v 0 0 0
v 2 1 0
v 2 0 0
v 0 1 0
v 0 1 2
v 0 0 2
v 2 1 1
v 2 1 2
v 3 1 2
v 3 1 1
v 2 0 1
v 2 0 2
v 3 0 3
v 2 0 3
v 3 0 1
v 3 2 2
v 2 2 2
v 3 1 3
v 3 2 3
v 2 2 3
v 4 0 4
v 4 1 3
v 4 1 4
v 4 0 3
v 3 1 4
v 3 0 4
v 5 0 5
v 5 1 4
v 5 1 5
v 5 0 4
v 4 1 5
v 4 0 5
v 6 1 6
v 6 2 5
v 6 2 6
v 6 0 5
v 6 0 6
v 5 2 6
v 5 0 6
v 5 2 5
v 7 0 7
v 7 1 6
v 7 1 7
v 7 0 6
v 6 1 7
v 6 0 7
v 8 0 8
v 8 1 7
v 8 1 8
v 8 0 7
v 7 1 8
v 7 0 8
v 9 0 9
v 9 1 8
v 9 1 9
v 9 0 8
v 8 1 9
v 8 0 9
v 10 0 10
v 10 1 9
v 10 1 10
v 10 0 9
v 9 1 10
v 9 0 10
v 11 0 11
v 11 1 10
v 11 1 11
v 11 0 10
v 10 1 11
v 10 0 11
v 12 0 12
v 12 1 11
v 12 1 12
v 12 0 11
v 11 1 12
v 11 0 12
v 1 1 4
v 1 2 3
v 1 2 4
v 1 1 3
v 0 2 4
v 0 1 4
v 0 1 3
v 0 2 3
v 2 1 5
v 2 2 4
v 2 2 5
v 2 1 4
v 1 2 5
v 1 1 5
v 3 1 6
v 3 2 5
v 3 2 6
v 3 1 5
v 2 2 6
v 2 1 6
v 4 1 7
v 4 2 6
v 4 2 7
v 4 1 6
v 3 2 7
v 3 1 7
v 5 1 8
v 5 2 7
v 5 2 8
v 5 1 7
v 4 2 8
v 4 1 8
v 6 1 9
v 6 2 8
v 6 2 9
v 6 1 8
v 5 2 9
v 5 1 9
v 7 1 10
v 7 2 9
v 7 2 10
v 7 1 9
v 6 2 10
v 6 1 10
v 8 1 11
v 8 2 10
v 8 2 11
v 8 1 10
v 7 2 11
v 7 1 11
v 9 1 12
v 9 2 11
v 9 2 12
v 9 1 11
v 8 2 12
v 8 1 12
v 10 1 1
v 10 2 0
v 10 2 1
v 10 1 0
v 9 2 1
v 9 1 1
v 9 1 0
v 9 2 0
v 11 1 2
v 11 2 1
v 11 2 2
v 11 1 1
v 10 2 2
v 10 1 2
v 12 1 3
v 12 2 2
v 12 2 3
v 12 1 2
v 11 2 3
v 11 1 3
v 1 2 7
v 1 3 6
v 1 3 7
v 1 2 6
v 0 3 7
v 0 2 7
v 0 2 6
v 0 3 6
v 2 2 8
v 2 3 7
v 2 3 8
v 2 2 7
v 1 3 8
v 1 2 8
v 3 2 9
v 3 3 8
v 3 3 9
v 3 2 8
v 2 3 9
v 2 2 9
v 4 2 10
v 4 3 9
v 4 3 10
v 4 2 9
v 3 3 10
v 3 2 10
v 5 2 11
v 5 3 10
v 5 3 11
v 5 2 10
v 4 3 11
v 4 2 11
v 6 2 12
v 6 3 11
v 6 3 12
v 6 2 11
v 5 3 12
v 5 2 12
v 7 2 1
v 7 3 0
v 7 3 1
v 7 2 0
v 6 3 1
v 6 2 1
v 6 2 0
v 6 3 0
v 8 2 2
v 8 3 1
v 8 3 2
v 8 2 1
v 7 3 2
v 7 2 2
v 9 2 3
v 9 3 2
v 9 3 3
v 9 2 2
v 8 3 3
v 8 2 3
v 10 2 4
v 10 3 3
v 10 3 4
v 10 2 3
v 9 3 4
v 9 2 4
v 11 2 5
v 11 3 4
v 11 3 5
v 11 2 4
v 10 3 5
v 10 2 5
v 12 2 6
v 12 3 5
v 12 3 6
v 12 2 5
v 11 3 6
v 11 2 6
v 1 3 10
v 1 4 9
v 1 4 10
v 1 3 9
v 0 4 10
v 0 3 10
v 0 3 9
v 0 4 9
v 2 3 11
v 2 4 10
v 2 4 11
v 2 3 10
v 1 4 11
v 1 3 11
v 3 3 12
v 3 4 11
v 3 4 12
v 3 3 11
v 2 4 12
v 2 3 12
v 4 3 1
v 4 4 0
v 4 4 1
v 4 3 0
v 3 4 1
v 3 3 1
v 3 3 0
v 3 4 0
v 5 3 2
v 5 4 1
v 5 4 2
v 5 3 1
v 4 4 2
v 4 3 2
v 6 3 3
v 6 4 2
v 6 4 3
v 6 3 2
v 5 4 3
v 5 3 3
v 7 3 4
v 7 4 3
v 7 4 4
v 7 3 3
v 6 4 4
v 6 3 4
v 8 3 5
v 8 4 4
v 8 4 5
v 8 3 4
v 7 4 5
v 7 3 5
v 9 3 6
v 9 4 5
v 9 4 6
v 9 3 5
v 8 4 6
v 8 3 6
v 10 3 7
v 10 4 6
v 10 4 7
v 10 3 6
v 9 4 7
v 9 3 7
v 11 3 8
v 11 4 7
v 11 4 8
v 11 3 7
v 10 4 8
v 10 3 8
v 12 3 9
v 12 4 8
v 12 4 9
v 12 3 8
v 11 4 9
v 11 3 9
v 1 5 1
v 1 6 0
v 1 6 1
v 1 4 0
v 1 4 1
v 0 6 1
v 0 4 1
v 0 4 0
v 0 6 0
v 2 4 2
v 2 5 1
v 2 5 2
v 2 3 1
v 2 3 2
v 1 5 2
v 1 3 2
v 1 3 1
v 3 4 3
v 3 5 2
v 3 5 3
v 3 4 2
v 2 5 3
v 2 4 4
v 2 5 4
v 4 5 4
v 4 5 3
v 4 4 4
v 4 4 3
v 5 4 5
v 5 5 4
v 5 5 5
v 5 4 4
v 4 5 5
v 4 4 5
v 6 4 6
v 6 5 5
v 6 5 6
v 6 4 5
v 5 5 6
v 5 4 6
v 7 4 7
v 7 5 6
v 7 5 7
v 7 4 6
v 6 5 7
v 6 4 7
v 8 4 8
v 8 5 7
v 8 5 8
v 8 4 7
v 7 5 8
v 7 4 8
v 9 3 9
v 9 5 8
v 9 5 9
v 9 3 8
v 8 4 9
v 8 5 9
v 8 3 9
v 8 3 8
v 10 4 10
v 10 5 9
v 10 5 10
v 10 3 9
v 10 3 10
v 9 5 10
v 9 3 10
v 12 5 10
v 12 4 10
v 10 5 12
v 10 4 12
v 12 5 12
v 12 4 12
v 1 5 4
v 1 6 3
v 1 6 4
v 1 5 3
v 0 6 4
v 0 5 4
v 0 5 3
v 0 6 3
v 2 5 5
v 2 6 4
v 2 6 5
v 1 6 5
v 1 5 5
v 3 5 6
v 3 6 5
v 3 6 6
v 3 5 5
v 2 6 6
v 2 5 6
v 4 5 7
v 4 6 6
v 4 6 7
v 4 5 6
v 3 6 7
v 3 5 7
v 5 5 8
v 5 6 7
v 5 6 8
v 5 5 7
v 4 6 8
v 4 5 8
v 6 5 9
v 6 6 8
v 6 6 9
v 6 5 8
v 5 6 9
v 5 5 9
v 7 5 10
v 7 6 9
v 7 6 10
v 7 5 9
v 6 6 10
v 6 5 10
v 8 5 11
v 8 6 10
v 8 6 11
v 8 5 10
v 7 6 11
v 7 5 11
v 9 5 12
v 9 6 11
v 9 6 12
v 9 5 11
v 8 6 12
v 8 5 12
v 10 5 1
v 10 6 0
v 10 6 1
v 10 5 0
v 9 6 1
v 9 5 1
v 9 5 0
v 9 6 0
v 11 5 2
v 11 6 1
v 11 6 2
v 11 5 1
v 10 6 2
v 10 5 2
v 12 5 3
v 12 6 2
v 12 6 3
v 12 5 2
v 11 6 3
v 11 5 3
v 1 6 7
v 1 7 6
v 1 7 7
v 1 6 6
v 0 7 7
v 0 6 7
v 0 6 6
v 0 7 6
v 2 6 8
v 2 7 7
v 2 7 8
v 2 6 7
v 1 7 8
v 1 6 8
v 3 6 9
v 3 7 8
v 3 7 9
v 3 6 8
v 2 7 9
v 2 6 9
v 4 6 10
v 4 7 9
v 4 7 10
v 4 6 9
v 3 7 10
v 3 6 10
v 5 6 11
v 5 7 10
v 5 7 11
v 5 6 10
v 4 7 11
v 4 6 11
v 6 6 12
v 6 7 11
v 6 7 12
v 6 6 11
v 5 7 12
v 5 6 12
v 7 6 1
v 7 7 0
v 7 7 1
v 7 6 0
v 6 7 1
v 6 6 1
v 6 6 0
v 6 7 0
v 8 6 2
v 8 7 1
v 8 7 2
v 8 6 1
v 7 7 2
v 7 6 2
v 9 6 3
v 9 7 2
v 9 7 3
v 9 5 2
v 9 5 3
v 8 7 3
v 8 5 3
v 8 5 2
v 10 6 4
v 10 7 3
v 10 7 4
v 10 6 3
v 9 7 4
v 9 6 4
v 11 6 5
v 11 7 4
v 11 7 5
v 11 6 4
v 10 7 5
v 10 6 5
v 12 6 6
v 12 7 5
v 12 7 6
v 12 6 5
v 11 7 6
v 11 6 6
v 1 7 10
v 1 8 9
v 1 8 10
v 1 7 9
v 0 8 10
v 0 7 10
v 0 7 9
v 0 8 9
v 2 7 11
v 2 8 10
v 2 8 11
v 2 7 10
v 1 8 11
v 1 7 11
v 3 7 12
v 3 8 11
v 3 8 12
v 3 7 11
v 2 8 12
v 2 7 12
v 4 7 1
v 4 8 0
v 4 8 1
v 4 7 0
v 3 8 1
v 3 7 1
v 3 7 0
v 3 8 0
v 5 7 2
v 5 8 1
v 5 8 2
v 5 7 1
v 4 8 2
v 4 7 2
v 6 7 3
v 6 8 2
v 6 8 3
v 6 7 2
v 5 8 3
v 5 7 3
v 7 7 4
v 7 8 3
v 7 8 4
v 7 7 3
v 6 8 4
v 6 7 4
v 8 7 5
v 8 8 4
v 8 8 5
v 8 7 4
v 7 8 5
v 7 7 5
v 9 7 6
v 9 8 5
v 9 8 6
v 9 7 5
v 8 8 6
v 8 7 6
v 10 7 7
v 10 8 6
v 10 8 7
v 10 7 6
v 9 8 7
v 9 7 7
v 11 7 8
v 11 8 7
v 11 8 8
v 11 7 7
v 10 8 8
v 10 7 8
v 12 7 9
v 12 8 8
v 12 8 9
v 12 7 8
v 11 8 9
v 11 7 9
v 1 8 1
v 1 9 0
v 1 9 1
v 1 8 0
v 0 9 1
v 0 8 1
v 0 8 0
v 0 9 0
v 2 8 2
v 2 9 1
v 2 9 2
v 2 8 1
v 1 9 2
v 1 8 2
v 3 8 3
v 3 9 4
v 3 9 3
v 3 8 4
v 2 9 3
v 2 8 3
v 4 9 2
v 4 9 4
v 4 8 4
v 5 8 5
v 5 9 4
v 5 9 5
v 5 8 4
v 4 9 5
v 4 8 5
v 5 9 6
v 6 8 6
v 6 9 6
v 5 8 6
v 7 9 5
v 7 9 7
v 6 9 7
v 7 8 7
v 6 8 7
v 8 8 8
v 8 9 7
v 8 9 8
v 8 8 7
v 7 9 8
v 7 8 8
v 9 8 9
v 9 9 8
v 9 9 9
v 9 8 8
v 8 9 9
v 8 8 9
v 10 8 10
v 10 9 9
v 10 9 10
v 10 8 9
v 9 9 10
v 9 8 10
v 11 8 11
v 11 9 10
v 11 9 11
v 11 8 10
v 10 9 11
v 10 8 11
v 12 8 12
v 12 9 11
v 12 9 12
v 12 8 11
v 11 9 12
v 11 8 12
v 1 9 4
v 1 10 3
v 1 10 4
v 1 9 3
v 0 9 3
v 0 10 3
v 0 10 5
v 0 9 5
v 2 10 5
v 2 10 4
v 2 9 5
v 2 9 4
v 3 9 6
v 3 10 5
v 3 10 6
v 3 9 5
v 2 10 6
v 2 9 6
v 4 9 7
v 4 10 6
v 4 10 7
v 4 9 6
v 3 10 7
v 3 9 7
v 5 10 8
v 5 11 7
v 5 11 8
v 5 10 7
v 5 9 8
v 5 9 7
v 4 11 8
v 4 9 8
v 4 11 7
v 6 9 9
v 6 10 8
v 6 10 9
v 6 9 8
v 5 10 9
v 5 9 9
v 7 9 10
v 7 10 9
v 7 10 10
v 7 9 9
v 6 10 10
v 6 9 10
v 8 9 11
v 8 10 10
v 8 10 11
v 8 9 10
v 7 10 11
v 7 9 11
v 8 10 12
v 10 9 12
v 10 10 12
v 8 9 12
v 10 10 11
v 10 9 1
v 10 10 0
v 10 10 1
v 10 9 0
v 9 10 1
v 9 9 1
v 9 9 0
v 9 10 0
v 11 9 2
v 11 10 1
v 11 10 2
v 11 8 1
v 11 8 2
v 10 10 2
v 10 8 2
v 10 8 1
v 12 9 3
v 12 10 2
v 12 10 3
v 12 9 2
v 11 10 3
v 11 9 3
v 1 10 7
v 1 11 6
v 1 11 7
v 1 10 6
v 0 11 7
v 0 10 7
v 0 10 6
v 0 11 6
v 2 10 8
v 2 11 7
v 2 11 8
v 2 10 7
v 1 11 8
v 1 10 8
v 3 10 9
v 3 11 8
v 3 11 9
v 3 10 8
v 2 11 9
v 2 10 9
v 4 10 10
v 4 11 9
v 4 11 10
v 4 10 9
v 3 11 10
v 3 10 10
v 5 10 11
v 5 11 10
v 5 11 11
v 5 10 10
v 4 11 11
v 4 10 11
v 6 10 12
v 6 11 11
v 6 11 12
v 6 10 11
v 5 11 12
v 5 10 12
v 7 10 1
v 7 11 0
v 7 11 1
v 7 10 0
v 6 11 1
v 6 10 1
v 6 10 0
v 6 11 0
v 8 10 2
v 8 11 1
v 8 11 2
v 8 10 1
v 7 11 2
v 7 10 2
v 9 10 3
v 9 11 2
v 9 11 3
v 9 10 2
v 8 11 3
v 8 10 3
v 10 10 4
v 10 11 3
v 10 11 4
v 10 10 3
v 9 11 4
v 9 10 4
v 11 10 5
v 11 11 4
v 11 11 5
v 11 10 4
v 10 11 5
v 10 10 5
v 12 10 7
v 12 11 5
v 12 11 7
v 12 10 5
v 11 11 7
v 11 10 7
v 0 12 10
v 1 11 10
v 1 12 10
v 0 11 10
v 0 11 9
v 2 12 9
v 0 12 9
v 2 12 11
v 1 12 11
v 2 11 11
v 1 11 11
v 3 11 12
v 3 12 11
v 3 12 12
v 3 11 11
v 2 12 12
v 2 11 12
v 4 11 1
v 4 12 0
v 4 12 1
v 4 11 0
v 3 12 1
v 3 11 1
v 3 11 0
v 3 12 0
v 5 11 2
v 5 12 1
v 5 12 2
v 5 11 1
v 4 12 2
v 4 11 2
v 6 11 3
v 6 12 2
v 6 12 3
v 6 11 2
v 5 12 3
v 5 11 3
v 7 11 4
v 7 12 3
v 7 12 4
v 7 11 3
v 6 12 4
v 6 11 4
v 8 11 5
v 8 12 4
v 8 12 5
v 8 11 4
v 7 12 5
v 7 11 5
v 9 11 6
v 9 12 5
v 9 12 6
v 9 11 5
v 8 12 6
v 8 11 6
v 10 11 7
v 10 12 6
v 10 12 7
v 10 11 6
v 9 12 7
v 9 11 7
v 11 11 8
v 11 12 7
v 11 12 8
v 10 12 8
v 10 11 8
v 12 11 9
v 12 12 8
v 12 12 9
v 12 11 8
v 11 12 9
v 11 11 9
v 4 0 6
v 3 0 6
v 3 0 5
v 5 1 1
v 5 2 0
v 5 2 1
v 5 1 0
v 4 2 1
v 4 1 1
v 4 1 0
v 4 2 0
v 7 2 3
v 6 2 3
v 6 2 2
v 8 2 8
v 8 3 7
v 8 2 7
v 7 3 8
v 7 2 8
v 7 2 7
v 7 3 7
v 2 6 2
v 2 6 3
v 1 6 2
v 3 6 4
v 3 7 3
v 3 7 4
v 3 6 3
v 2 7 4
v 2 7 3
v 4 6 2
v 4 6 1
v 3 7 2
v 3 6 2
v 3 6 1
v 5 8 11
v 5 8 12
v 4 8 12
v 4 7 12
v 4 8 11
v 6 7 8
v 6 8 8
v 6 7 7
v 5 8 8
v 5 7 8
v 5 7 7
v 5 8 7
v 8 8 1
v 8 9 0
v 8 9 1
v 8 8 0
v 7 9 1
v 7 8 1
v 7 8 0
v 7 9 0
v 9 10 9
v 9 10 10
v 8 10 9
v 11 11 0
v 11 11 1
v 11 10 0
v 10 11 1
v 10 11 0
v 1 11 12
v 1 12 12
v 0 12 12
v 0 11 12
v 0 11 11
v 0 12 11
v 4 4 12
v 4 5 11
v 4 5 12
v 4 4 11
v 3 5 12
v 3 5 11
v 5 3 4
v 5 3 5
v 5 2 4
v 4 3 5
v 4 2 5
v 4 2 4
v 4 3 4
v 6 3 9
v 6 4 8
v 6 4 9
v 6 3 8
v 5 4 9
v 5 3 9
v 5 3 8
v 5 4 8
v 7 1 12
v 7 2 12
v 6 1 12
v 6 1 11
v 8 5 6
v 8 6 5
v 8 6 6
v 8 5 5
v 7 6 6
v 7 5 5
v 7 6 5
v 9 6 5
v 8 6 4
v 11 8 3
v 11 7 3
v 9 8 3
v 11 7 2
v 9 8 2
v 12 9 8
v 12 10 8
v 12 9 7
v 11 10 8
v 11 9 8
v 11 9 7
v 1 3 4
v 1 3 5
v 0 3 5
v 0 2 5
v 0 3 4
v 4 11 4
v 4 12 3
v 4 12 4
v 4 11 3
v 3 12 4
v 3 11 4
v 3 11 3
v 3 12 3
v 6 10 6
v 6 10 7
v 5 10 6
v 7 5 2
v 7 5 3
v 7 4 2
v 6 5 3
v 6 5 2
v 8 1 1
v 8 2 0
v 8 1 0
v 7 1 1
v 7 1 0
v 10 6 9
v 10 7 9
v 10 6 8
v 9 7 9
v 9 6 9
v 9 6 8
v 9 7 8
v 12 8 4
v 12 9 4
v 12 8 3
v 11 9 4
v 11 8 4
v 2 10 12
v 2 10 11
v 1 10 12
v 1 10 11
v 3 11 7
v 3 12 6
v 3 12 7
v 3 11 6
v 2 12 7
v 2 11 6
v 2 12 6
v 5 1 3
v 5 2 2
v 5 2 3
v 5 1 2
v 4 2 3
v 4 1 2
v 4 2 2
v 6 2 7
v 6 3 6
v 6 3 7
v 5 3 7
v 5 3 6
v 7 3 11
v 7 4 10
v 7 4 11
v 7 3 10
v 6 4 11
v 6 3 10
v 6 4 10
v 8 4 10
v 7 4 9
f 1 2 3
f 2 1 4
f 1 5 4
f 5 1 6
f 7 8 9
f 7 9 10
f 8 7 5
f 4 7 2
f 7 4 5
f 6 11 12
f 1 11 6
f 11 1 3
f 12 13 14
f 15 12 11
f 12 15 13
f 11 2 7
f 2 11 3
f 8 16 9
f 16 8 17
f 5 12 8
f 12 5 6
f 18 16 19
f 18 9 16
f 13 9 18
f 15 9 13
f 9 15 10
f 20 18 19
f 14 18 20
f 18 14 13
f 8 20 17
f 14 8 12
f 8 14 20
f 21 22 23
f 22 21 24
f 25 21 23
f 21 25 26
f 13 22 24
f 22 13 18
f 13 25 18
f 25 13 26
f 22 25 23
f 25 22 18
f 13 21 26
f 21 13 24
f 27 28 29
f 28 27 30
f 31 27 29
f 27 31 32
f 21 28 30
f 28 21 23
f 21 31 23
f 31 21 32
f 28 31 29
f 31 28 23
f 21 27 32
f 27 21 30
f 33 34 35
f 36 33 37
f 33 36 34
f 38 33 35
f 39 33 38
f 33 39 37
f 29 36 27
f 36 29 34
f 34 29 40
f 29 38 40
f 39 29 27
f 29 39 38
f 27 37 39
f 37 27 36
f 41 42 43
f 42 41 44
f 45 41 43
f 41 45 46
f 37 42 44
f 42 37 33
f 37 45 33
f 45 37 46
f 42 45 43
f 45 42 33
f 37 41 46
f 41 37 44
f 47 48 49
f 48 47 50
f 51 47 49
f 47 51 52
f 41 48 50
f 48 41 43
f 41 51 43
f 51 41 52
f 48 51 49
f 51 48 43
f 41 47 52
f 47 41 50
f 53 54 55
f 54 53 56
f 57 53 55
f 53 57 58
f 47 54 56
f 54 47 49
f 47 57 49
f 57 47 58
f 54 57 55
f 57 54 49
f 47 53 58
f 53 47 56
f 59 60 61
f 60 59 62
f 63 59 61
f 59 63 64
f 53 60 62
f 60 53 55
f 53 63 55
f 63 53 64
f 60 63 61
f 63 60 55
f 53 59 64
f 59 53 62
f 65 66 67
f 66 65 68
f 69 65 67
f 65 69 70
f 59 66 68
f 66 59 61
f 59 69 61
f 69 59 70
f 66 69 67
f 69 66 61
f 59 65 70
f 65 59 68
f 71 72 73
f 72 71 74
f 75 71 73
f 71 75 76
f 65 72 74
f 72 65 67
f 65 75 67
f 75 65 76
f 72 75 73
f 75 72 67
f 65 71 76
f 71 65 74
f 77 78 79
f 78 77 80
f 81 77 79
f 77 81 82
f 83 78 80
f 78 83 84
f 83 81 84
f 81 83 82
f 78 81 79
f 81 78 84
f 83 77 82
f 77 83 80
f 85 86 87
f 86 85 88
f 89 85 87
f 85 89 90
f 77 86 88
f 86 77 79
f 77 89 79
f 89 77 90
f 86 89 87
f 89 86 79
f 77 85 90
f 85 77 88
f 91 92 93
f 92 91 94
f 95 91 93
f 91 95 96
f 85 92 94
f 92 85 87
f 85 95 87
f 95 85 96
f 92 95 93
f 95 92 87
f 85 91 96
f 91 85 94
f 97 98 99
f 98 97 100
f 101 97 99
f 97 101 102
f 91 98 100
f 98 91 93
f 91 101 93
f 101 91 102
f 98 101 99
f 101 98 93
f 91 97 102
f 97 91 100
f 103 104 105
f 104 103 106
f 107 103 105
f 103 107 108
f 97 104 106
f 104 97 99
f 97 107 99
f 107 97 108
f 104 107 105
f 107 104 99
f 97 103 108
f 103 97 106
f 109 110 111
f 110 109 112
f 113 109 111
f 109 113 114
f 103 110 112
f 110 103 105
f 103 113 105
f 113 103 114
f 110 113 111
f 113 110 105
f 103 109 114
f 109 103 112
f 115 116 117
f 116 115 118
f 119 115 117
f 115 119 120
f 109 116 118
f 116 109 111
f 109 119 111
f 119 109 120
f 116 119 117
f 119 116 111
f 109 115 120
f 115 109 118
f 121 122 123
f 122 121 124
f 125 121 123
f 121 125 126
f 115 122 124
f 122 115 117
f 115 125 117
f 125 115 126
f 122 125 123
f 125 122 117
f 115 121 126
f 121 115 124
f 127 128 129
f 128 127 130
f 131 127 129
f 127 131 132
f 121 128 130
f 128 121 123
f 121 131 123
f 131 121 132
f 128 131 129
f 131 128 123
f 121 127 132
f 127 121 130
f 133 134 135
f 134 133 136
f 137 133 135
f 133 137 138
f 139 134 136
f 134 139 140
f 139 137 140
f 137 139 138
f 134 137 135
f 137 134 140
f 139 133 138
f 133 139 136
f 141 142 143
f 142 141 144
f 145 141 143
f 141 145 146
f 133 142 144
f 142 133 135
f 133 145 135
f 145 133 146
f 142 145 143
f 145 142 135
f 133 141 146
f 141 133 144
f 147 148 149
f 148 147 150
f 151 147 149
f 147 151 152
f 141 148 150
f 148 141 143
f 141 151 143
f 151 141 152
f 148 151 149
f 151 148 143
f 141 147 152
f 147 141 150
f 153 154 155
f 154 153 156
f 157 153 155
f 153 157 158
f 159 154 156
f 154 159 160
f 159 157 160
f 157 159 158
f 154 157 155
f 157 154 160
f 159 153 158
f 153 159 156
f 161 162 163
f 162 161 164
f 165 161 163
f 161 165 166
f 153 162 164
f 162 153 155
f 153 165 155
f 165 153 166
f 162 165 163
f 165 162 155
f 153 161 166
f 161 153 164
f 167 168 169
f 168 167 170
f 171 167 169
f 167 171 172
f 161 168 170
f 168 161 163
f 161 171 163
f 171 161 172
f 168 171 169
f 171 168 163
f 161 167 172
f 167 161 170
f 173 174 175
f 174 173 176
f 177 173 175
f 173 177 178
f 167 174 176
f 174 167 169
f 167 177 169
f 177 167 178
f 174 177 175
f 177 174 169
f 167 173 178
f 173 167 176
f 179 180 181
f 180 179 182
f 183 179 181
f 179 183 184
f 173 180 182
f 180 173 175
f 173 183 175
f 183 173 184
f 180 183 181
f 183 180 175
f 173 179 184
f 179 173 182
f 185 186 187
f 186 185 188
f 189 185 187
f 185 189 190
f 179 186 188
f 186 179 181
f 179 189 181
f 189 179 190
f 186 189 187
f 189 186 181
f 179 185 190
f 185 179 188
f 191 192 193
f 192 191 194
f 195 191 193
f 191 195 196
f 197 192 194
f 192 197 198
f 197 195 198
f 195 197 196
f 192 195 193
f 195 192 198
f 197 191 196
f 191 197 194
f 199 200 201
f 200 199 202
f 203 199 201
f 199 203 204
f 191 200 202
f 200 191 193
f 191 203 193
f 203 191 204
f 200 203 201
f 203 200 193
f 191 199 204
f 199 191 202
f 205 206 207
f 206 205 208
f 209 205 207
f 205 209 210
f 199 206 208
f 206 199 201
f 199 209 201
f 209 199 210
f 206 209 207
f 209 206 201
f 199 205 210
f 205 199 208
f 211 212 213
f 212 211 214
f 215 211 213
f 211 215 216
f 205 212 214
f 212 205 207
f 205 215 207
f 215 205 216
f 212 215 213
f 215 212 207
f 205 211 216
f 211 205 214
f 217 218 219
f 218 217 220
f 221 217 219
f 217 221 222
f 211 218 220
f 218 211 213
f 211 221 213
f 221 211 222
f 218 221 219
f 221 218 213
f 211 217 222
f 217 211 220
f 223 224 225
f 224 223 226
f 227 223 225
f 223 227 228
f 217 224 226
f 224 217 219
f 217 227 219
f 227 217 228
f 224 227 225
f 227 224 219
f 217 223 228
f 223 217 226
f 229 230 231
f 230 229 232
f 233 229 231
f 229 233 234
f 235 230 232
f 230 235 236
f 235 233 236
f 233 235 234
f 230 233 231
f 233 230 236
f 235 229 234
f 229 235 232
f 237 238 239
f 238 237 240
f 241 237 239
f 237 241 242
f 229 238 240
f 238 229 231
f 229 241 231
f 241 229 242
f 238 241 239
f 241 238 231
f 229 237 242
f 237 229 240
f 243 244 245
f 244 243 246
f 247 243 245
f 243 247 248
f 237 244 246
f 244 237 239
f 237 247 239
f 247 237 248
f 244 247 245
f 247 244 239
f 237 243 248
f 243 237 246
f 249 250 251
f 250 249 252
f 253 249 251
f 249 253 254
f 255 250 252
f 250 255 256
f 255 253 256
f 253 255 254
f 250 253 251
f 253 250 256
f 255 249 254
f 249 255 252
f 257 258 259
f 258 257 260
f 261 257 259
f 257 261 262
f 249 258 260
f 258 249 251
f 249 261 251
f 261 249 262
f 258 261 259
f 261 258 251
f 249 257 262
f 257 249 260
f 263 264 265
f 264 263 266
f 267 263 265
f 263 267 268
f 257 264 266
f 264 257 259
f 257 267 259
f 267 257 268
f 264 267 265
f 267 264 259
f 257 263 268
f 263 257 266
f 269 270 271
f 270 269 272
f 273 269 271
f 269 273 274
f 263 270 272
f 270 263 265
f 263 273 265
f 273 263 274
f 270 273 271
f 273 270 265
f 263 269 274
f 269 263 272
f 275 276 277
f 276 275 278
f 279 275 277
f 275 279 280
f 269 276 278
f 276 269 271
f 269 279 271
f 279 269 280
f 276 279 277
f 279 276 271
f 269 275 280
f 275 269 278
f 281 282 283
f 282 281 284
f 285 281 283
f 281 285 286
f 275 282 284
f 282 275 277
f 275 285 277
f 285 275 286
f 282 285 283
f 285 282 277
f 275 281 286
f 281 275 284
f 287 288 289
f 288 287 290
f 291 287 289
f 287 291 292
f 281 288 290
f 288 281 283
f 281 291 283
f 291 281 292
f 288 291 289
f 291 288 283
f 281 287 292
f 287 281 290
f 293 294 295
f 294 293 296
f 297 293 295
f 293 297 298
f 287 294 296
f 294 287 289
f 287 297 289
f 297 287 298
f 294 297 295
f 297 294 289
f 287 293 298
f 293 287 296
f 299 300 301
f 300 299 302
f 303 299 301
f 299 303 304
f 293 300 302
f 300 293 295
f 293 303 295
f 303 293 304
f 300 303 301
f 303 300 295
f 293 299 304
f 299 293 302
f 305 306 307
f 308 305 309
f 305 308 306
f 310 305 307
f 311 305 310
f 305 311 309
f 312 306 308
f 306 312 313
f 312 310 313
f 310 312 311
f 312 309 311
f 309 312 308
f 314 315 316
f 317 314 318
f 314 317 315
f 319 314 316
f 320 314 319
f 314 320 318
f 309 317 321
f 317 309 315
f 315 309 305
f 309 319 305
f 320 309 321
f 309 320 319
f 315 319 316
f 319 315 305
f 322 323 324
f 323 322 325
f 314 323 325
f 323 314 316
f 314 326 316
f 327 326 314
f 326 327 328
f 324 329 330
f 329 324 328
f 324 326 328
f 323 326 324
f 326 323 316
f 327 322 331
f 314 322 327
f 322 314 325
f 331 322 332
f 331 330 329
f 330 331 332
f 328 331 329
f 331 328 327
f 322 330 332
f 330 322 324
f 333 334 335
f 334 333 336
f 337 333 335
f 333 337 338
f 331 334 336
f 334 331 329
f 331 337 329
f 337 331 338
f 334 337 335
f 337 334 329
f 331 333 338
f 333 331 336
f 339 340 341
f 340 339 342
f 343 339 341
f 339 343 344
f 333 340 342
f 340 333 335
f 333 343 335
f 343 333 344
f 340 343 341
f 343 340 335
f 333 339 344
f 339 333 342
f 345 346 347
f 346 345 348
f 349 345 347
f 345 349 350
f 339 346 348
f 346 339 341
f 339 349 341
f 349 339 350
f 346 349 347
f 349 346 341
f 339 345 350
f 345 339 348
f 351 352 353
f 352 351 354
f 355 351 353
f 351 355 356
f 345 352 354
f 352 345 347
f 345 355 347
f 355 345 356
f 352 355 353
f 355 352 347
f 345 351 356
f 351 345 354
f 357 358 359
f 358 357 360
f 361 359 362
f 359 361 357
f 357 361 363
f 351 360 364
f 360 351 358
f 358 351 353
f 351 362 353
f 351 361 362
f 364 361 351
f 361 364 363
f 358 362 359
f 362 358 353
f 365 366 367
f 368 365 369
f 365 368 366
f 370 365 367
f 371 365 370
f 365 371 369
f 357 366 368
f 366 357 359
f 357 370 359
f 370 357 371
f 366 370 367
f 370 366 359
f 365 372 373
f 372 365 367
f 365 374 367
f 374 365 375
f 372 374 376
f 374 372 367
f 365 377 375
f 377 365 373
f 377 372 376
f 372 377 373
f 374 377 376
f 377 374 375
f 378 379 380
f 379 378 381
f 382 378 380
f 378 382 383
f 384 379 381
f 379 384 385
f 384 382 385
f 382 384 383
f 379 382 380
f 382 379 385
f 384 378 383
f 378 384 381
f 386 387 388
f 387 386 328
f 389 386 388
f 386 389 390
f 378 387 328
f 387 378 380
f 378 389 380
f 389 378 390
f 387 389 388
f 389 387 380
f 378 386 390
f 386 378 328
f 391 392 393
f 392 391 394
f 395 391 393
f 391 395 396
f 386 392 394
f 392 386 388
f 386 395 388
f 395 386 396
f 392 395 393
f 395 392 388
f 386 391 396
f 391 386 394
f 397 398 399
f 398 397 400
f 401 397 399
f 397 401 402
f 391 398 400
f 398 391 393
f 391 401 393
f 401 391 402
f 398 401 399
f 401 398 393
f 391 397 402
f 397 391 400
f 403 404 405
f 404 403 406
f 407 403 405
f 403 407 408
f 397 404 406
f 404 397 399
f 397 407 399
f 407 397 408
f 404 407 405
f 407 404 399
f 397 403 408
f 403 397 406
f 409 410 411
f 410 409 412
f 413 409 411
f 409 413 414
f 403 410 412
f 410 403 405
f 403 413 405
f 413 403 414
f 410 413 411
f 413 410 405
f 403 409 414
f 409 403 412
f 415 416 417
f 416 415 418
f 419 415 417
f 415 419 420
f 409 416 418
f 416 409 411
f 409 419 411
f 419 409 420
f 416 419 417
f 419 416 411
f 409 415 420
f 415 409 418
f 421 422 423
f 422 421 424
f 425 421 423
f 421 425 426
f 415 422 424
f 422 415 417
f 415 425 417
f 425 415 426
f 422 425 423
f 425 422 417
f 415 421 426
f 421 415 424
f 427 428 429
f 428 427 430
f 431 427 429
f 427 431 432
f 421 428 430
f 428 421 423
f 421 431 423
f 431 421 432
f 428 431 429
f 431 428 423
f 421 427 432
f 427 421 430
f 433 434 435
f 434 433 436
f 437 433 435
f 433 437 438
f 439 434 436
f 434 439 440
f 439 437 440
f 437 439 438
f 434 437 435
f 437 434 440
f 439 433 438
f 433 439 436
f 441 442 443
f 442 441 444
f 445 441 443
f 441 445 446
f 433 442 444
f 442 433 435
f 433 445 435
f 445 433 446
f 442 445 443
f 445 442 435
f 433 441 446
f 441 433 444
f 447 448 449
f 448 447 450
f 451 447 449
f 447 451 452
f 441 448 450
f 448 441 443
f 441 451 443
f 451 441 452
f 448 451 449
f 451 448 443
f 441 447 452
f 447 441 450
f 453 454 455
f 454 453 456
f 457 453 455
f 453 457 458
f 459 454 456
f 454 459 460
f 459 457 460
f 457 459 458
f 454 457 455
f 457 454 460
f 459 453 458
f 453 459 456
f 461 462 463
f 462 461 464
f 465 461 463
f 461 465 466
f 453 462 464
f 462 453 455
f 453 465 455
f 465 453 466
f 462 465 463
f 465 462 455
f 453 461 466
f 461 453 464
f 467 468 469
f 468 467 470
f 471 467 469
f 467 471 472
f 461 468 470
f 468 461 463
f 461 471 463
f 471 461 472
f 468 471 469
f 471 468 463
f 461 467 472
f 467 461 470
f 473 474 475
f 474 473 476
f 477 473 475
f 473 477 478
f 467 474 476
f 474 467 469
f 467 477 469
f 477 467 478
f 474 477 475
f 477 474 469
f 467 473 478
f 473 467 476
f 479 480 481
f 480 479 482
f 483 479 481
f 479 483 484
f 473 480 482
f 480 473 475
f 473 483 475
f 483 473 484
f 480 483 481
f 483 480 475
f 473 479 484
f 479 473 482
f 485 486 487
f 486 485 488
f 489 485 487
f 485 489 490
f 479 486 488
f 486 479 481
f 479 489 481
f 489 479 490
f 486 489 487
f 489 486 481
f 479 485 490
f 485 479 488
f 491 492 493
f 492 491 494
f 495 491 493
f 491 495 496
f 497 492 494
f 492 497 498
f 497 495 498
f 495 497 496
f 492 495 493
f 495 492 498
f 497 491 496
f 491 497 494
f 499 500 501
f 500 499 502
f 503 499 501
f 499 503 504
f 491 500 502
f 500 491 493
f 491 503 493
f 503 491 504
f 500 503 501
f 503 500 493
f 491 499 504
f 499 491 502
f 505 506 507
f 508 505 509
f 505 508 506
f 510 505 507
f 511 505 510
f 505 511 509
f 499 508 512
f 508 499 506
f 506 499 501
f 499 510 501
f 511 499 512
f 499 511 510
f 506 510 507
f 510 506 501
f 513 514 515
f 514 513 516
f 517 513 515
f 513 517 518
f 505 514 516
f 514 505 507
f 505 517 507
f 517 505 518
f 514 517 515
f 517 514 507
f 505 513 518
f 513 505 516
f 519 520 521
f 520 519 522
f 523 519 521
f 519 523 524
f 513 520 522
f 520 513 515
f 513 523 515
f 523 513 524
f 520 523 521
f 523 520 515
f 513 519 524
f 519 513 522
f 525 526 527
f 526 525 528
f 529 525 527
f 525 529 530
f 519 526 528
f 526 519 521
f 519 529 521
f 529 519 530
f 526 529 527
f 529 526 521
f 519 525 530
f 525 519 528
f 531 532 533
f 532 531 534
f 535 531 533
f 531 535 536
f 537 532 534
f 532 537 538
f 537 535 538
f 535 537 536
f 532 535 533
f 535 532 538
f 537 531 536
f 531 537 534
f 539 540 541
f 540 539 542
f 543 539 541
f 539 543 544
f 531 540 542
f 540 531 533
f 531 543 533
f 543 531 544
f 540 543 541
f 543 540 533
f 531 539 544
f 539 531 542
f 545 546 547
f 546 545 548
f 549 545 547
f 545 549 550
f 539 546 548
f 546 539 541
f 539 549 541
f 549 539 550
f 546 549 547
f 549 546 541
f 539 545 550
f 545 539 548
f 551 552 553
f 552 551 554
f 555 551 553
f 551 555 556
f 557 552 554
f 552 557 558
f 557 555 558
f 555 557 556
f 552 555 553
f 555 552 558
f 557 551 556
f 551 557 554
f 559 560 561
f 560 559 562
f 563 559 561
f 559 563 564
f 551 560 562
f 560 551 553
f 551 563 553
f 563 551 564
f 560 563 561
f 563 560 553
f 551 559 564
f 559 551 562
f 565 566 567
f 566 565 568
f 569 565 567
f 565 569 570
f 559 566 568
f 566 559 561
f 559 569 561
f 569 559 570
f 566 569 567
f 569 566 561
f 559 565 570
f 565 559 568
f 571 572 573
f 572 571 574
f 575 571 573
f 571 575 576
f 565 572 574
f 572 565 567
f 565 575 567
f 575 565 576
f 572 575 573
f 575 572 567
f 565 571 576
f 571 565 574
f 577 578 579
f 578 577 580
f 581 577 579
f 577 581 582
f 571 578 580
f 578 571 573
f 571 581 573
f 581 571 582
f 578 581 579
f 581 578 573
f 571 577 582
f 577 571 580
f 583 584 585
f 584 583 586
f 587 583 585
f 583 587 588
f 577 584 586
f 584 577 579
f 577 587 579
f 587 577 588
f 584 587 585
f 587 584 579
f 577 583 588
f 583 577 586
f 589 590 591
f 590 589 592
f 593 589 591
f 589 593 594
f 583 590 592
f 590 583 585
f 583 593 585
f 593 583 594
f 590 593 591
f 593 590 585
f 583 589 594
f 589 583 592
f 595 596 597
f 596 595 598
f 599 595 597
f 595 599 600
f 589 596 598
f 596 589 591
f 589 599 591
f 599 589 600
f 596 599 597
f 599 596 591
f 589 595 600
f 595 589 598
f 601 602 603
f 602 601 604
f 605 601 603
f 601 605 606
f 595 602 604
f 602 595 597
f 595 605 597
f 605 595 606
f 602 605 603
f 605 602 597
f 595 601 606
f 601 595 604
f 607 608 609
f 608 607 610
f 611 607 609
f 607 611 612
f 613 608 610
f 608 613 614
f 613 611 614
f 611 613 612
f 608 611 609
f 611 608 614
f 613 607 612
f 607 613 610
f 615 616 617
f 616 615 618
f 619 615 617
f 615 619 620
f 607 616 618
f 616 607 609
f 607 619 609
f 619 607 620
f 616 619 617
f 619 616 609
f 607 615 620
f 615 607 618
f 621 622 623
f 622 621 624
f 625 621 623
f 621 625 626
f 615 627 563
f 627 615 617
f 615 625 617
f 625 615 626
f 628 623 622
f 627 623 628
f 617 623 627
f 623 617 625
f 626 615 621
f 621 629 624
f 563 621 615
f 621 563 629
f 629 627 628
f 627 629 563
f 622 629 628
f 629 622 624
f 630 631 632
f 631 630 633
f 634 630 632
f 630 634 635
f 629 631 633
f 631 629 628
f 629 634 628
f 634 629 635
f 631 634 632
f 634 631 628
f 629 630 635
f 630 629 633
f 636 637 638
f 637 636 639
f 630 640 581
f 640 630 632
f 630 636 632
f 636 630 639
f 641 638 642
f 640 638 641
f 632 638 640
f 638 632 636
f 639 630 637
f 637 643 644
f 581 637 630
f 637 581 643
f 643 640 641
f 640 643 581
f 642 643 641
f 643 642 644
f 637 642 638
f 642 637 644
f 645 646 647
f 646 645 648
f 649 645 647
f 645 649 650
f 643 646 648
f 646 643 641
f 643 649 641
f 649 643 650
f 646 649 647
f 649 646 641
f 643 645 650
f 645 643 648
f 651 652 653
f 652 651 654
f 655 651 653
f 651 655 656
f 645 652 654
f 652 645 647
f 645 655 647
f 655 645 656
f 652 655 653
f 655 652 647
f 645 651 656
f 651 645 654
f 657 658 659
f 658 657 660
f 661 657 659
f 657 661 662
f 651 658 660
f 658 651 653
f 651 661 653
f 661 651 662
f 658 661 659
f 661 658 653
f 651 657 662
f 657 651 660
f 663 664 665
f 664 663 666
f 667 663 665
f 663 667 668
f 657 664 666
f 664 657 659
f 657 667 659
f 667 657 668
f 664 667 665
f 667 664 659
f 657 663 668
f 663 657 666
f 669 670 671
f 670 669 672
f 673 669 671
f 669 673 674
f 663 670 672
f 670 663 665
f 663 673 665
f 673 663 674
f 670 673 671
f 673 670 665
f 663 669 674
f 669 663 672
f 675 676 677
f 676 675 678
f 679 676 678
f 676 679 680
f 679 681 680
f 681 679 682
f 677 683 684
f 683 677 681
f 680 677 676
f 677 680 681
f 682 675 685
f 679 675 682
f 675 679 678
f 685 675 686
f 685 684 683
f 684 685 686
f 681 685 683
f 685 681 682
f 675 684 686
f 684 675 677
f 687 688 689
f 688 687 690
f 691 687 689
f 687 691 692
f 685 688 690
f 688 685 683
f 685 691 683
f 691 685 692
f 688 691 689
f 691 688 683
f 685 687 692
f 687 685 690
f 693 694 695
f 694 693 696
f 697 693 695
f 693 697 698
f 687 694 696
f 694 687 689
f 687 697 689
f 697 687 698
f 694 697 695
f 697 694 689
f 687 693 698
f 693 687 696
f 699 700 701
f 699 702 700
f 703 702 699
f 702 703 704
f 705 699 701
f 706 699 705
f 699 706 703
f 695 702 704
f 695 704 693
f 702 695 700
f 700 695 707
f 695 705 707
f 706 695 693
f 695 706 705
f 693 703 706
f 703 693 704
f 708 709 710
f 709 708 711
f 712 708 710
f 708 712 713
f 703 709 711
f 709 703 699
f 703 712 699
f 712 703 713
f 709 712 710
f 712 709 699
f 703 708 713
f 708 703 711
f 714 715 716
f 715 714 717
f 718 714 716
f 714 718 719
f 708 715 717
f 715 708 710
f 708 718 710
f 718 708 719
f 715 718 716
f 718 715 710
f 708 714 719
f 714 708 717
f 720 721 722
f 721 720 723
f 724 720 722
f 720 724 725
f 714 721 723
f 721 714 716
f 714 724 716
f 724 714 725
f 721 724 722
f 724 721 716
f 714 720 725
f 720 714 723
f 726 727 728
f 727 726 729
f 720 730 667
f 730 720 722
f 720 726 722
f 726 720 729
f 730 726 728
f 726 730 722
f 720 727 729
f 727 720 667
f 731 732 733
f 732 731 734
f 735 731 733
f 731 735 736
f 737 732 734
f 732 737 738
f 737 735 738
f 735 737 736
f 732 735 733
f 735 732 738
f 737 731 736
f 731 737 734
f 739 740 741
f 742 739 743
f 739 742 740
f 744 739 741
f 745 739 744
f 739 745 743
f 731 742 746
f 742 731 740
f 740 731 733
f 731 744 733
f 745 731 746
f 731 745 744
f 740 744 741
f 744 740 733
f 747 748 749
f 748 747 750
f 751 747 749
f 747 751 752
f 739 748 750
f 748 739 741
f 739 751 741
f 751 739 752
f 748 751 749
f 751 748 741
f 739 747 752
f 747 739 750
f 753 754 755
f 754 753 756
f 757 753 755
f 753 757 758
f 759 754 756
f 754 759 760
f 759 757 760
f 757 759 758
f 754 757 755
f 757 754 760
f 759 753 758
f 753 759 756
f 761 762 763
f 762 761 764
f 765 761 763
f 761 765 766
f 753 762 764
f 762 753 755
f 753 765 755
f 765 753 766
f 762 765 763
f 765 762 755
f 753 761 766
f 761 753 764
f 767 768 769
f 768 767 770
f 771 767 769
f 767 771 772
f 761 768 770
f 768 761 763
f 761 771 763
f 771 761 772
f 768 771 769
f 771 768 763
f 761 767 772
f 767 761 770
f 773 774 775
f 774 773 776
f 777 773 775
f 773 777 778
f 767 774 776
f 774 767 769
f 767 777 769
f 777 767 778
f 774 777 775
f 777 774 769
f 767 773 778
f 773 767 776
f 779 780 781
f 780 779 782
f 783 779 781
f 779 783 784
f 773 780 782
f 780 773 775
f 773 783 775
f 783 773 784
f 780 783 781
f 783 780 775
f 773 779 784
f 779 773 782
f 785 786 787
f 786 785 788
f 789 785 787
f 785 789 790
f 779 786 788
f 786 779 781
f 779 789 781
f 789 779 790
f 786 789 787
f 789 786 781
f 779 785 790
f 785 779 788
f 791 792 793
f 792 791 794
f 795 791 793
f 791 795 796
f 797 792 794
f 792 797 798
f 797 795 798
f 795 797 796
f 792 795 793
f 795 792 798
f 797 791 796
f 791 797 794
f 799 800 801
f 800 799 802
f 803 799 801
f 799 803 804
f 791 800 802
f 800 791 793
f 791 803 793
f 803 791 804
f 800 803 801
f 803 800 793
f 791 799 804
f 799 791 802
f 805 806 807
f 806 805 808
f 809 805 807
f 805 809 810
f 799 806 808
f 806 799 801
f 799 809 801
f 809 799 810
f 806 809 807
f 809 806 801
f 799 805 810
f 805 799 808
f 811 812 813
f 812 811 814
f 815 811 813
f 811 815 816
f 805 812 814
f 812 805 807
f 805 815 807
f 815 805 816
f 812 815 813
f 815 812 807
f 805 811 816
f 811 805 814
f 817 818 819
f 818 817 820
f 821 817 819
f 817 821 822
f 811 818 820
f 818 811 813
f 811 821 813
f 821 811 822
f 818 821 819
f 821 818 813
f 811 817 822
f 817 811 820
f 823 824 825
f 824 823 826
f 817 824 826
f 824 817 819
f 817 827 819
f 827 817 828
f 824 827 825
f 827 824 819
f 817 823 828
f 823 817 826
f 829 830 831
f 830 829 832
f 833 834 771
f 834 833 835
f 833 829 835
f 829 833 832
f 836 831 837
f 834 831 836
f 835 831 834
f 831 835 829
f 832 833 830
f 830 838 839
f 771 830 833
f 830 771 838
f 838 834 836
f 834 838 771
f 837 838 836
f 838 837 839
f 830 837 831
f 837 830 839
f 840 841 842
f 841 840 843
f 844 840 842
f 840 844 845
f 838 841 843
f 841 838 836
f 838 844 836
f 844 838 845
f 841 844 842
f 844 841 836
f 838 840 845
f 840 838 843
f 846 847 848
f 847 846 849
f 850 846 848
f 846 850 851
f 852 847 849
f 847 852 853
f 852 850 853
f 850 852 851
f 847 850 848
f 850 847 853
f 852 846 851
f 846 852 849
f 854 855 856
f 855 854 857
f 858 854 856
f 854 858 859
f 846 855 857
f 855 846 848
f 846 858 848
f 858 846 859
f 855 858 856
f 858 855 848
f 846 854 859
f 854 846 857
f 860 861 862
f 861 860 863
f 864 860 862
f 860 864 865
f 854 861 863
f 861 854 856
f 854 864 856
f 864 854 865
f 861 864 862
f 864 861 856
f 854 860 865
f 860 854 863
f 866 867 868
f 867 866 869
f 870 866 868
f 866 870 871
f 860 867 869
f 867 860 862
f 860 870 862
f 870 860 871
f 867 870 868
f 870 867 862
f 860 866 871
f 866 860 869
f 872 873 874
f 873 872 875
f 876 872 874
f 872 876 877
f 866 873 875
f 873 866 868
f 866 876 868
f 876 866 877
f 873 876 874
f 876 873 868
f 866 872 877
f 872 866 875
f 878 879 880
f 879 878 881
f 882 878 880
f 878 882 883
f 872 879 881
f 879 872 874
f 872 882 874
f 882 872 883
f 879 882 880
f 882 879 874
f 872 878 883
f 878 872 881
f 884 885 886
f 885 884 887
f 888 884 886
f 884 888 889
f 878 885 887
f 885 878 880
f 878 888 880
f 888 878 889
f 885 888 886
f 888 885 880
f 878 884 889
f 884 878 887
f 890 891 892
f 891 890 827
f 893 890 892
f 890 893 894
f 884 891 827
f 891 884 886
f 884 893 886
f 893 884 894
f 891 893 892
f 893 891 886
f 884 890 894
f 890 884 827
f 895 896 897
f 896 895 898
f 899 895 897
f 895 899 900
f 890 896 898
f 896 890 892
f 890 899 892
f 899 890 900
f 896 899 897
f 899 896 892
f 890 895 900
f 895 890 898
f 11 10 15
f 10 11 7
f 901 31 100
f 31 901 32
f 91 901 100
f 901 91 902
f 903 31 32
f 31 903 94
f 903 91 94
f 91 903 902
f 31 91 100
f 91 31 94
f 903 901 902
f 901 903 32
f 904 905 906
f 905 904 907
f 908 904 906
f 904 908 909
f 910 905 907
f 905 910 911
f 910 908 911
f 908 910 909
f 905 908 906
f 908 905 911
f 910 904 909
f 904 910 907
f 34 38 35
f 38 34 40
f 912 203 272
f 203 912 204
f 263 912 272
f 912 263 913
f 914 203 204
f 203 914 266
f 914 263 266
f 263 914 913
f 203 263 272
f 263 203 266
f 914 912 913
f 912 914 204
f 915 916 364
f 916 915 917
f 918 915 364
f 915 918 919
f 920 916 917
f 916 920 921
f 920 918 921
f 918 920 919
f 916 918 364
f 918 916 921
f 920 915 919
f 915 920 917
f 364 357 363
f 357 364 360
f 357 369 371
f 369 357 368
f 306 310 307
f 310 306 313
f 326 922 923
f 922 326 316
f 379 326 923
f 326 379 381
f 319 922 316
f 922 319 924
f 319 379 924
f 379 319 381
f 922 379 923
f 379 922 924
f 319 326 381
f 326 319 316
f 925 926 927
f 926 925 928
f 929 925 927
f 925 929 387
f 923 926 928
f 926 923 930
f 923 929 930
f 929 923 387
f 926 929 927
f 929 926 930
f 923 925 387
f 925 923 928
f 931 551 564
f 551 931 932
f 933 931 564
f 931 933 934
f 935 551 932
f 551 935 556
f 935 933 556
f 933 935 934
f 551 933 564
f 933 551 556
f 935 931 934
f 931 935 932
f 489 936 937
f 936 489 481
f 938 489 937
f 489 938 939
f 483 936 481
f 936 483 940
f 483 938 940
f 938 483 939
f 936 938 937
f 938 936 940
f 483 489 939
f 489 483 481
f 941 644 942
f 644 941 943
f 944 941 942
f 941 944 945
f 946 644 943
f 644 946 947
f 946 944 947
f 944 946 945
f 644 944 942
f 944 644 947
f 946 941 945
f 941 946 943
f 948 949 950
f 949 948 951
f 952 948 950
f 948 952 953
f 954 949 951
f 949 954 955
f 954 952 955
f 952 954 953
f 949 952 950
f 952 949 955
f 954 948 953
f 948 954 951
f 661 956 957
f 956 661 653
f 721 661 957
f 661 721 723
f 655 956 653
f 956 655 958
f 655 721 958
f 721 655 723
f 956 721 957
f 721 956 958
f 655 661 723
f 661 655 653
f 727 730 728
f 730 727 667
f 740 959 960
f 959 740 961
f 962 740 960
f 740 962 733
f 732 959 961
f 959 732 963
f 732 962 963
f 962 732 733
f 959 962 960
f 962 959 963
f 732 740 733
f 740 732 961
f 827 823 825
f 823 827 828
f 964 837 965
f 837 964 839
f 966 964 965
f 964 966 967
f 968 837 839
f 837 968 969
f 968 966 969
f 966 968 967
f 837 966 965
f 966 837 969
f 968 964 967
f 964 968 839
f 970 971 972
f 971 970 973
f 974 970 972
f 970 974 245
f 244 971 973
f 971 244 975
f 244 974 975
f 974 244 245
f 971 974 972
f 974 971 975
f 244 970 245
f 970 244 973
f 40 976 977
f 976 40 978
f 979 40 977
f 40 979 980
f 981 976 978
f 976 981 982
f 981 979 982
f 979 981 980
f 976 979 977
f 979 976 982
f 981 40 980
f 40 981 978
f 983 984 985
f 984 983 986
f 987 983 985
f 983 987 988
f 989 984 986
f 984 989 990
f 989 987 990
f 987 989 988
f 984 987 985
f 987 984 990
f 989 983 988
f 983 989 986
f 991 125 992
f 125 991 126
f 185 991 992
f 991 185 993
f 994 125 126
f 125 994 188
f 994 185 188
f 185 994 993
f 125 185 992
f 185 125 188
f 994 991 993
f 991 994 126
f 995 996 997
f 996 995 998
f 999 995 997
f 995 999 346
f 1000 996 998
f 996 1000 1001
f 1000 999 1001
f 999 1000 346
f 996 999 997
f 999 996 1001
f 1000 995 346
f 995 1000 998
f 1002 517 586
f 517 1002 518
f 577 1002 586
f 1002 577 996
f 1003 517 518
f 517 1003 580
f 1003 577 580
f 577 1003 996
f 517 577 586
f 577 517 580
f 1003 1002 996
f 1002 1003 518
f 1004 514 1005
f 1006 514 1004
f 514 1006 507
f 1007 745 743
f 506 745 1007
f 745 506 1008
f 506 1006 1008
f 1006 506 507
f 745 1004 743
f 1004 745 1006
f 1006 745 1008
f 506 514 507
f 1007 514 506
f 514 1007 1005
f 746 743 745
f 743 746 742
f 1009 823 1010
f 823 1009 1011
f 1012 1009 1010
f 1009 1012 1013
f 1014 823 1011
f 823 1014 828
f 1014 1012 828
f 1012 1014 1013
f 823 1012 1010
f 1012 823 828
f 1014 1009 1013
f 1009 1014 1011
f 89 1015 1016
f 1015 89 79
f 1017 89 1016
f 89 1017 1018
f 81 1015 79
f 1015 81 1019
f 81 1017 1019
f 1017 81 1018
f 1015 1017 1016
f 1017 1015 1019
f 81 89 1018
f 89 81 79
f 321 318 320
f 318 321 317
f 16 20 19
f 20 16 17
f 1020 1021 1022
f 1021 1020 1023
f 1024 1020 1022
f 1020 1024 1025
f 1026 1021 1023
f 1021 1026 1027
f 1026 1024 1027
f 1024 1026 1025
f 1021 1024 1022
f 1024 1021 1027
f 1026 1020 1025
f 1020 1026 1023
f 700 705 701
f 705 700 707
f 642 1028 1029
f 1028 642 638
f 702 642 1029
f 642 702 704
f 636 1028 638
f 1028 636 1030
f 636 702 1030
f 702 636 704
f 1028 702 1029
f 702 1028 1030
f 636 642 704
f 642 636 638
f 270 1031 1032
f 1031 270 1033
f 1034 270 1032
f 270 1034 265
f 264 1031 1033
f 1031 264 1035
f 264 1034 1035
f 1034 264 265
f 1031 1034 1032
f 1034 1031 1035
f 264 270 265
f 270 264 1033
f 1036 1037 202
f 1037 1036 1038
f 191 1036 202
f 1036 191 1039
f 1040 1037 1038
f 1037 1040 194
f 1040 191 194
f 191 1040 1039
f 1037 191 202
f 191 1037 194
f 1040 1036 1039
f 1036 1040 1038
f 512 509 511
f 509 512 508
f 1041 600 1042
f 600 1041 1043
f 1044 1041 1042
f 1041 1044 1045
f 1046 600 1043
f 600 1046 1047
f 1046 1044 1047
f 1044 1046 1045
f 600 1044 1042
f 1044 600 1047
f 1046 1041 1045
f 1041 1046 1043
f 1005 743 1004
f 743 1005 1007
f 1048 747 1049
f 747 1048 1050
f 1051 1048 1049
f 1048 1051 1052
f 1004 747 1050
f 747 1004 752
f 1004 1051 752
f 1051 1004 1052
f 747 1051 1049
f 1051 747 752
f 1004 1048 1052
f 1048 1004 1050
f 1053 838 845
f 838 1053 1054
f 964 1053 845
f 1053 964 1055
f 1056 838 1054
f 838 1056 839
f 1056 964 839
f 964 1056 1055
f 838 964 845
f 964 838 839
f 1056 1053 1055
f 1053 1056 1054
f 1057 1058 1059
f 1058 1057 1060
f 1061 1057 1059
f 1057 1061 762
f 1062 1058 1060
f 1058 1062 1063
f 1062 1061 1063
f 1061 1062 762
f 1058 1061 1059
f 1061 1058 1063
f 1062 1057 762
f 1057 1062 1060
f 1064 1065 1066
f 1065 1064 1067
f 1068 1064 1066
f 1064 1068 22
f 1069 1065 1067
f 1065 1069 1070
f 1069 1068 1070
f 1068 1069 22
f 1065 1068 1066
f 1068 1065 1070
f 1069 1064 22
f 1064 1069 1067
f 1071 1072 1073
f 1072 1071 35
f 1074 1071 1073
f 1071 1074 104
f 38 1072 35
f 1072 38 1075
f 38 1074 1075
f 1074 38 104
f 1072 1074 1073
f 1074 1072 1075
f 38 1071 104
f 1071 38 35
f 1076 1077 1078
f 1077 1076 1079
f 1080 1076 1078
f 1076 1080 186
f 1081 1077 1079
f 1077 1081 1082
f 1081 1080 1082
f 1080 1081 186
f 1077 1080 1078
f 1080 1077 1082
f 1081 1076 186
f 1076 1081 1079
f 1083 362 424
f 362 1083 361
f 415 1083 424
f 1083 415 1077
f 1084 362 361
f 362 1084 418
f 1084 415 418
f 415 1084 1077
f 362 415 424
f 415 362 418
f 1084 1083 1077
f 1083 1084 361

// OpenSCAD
union() {
    translate([0, 0, 0]) cube([1, 1, 1]);
    translate([1, 0, 1]) cube([1, 1, 1]);
    translate([2, 0, 2]) cube([1, 1, 1]);
    translate([3, 0, 3]) cube([1, 1, 1]);
    translate([4, 0, 4]) cube([1, 1, 1]);
    translate([5, 0, 5]) cube([1, 1, 1]);
    translate([6, 0, 6]) cube([1, 1, 1]);
    translate([7, 0, 7]) cube([1, 1, 1]);
    translate([8, 0, 8]) cube([1, 1, 1]);
    translate([9, 0, 9]) cube([1, 1, 1]);
    translate([10, 0, 10]) cube([1, 1, 1]);
    translate([11, 0, 11]) cube([1, 1, 1]);
    translate([0, 1, 3]) cube([1, 1, 1]);
    translate([1, 1, 4]) cube([1, 1, 1]);
    translate([2, 1, 5]) cube([1, 1, 1]);
    translate([3, 1, 6]) cube([1, 1, 1]);
    translate([4, 1, 7]) cube([1, 1, 1]);
    translate([5, 1, 8]) cube([1, 1, 1]);
    translate([6, 1, 9]) cube([1, 1, 1]);
    translate([7, 1, 10]) cube([1, 1, 1]);
    translate([8, 1, 11]) cube([1, 1, 1]);
    translate([9, 1, 0]) cube([1, 1, 1]);
    translate([10, 1, 1]) cube([1, 1, 1]);
    translate([11, 1, 2]) cube([1, 1, 1]);
    translate([0, 2, 6]) cube([1, 1, 1]);
    translate([1, 2, 7]) cube([1, 1, 1]);
    translate([2, 2, 8]) cube([1, 1, 1]);
    translate([3, 2, 9]) cube([1, 1, 1]);
    translate([4, 2, 10]) cube([1, 1, 1]);
    translate([5, 2, 11]) cube([1, 1, 1]);
    translate([6, 2, 0]) cube([1, 1, 1]);
    translate([7, 2, 1]) cube([1, 1, 1]);
    translate([8, 2, 2]) cube([1, 1, 1]);
    translate([9, 2, 3]) cube([1, 1, 1]);
    translate([10, 2, 4]) cube([1, 1, 1]);
    translate([11, 2, 5]) cube([1, 1, 1]);
    translate([0, 3, 9]) cube([1, 1, 1]);
    translate([1, 3, 10]) cube([1, 1, 1]);
    translate([2, 3, 11]) cube([1, 1, 1]);
    translate([3, 3, 0]) cube([1, 1, 1]);
    translate([4, 3, 1]) cube([1, 1, 1]);
    translate([5, 3, 2]) cube([1, 1, 1]);
    translate([6, 3, 3]) cube([1, 1, 1]);
    translate([7, 3, 4]) cube([1, 1, 1]);
    translate([8, 3, 5]) cube([1, 1, 1]);
    translate([9, 3, 6]) cube([1, 1, 1]);
    translate([10, 3, 7]) cube([1, 1, 1]);
    translate([11, 3, 8]) cube([1, 1, 1]);
    translate([0, 4, 0]) cube([1, 1, 1]);
    translate([1, 4, 1]) cube([1, 1, 1]);
    translate([2, 4, 2]) cube([1, 1, 1]);
    translate([3, 4, 3]) cube([1, 1, 1]);
    translate([4, 4, 4]) cube([1, 1, 1]);
    translate([5, 4, 5]) cube([1, 1, 1]);
    translate([6, 4, 6]) cube([1, 1, 1]);
    translate([7, 4, 7]) cube([1, 1, 1]);
    translate([8, 4, 8]) cube([1, 1, 1]);
    translate([9, 4, 9]) cube([1, 1, 1]);
    translate([10, 4, 10]) cube([1, 1, 1]);
    translate([11, 4, 11]) cube([1, 1, 1]);
    translate([0, 5, 3]) cube([1, 1, 1]);
    translate([1, 5, 4]) cube([1, 1, 1]);
    translate([2, 5, 5]) cube([1, 1, 1]);
    translate([3, 5, 6]) cube([1, 1, 1]);
    translate([4, 5, 7]) cube([1, 1, 1]);
    translate([5, 5, 8]) cube([1, 1, 1]);
    translate([6, 5, 9]) cube([1, 1, 1]);
    translate([7, 5, 10]) cube([1, 1, 1]);
    translate([8, 5, 11]) cube([1, 1, 1]);
    translate([9, 5, 0]) cube([1, 1, 1]);
    translate([10, 5, 1]) cube([1, 1, 1]);
    translate([11, 5, 2]) cube([1, 1, 1]);
    translate([0, 6, 6]) cube([1, 1, 1]);
    translate([1, 6, 7]) cube([1, 1, 1]);
    translate([2, 6, 8]) cube([1, 1, 1]);
    translate([3, 6, 9]) cube([1, 1, 1]);
    translate([4, 6, 10]) cube([1, 1, 1]);
    translate([5, 6, 11]) cube([1, 1, 1]);
    translate([6, 6, 0]) cube([1, 1, 1]);
    translate([7, 6, 1]) cube([1, 1, 1]);
    translate([8, 6, 2]) cube([1, 1, 1]);
    translate([9, 6, 3]) cube([1, 1, 1]);
    translate([10, 6, 4]) cube([1, 1, 1]);
    translate([11, 6, 5]) cube([1, 1, 1]);
    translate([0, 7, 9]) cube([1, 1, 1]);
    translate([1, 7, 10]) cube([1, 1, 1]);
    translate([2, 7, 11]) cube([1, 1, 1]);
    translate([3, 7, 0]) cube([1, 1, 1]);
    translate([4, 7, 1]) cube([1, 1, 1]);
    translate([5, 7, 2]) cube([1, 1, 1]);
    translate([6, 7, 3]) cube([1, 1, 1]);
    translate([7, 7, 4]) cube([1, 1, 1]);
    translate([8, 7, 5]) cube([1, 1, 1]);
    translate([9, 7, 6]) cube([1, 1, 1]);
    translate([10, 7, 7]) cube([1, 1, 1]);
    translate([11, 7, 8]) cube([1, 1, 1]);
    translate([0, 8, 0]) cube([1, 1, 1]);
    translate([1, 8, 1]) cube([1, 1, 1]);
    translate([2, 8, 2]) cube([1, 1, 1]);
    translate([3, 8, 3]) cube([1, 1, 1]);
    translate([4, 8, 4]) cube([1, 1, 1]);
    translate([5, 8, 5]) cube([1, 1, 1]);
    translate([6, 8, 6]) cube([1, 1, 1]);
    translate([7, 8, 7]) cube([1, 1, 1]);
    translate([8, 8, 8]) cube([1, 1, 1]);
    translate([9, 8, 9]) cube([1, 1, 1]);
    translate([10, 8, 10]) cube([1, 1, 1]);
    translate([11, 8, 11]) cube([1, 1, 1]);
    translate([0, 9, 3]) cube([1, 1, 1]);
    translate([1, 9, 4]) cube([1, 1, 1]);
    translate([2, 9, 5]) cube([1, 1, 1]);
    translate([3, 9, 6]) cube([1, 1, 1]);
    translate([4, 9, 7]) cube([1, 1, 1]);
    translate([5, 9, 8]) cube([1, 1, 1]);
    translate([6, 9, 9]) cube([1, 1, 1]);
    translate([7, 9, 10]) cube([1, 1, 1]);
    translate([8, 9, 11]) cube([1, 1, 1]);
    translate([9, 9, 0]) cube([1, 1, 1]);
    translate([10, 9, 1]) cube([1, 1, 1]);
    translate([11, 9, 2]) cube([1, 1, 1]);
    translate([0, 10, 6]) cube([1, 1, 1]);
    translate([1, 10, 7]) cube([1, 1, 1]);
    translate([2, 10, 8]) cube([1, 1, 1]);
    translate([3, 10, 9]) cube([1, 1, 1]);
    translate([4, 10, 10]) cube([1, 1, 1]);
    translate([5, 10, 11]) cube([1, 1, 1]);
    translate([6, 10, 0]) cube([1, 1, 1]);
    translate([7, 10, 1]) cube([1, 1, 1]);
    translate([8, 10, 2]) cube([1, 1, 1]);
    translate([9, 10, 3]) cube([1, 1, 1]);
    translate([10, 10, 4]) cube([1, 1, 1]);
    translate([11, 10, 5]) cube([1, 1, 1]);
    translate([0, 11, 9]) cube([1, 1, 1]);
    translate([1, 11, 10]) cube([1, 1, 1]);
    translate([2, 11, 11]) cube([1, 1, 1]);
    translate([3, 11, 0]) cube([1, 1, 1]);
    translate([4, 11, 1]) cube([1, 1, 1]);
    translate([5, 11, 2]) cube([1, 1, 1]);
    translate([6, 11, 3]) cube([1, 1, 1]);
    translate([7, 11, 4]) cube([1, 1, 1]);
    translate([8, 11, 5]) cube([1, 1, 1]);
    translate([9, 11, 6]) cube([1, 1, 1]);
    translate([10, 11, 7]) cube([1, 1, 1]);
    translate([11, 11, 8]) cube([1, 1, 1]);
    translate([0, 0, 1]) cube([1, 1, 1]);
    translate([1, 0, 0]) cube([1, 1, 1]);
    translate([2, 0, 1]) cube([1, 1, 1]);
    translate([3, 0, 5]) cube([1, 1, 1]);
    translate([4, 1, 0]) cube([1, 1, 1]);
    translate([5, 1, 5]) cube([1, 1, 1]);
    translate([6, 2, 2]) cube([1, 1, 1]);
    translate([7, 2, 7]) cube([1, 1, 1]);
    translate([8, 3, 8]) cube([1, 1, 1]);
    translate([9, 3, 9]) cube([1, 1, 1]);
    translate([10, 4, 11]) cube([1, 1, 1]);
    translate([11, 4, 10]) cube([1, 1, 1]);
    translate([0, 5, 0]) cube([1, 1, 1]);
    translate([1, 5, 2]) cube([1, 1, 1]);
    translate([2, 6, 3]) cube([1, 1, 1]);
    translate([3, 6, 1]) cube([1, 1, 1]);
    translate([4, 7, 11]) cube([1, 1, 1]);
    translate([5, 7, 7]) cube([1, 1, 1]);
    translate([6, 8, 5]) cube([1, 1, 1]);
    translate([7, 8, 0]) cube([1, 1, 1]);
    translate([8, 9, 9]) cube([1, 1, 1]);
    translate([9, 9, 11]) cube([1, 1, 1]);
    translate([10, 10, 0]) cube([1, 1, 1]);
    translate([11, 10, 6]) cube([1, 1, 1]);
    translate([0, 11, 11]) cube([1, 1, 1]);
    translate([1, 11, 9]) cube([1, 1, 1]);
    translate([2, 4, 3]) cube([1, 1, 1]);
    translate([3, 4, 11]) cube([1, 1, 1]);
    translate([4, 2, 4]) cube([1, 1, 1]);
    translate([5, 3, 8]) cube([1, 1, 1]);
    translate([6, 1, 11]) cube([1, 1, 1]);
    translate([7, 5, 5]) cube([1, 1, 1]);
    translate([8, 6, 4]) cube([1, 1, 1]);
    translate([9, 7, 2]) cube([1, 1, 1]);
    translate([10, 8, 1]) cube([1, 1, 1]);
    translate([11, 9, 7]) cube([1, 1, 1]);
    translate([0, 2, 4]) cube([1, 1, 1]);
    translate([1, 3, 1]) cube([1, 1, 1]);
    translate([2, 1, 2]) cube([1, 1, 1]);
    translate([3, 11, 3]) cube([1, 1, 1]);
    translate([4, 10, 7]) cube([1, 1, 1]);
    translate([5, 9, 6]) cube([1, 1, 1]);
    translate([6, 4, 2]) cube([1, 1, 1]);
    translate([7, 1, 0]) cube([1, 1, 1]);
    translate([8, 5, 2]) cube([1, 1, 1]);
    translate([9, 6, 8]) cube([1, 1, 1]);
    translate([10, 7, 2]) cube([1, 1, 1]);
    translate([11, 8, 3]) cube([1, 1, 1]);
    translate([0, 9, 4]) cube([1, 1, 1]);
    translate([1, 10, 11]) cube([1, 1, 1]);
    translate([2, 11, 6]) cube([1, 1, 1]);
    translate([3, 8, 2]) cube([1, 1, 1]);
    translate([4, 1, 2]) cube([1, 1, 1]);
    translate([5, 2, 6]) cube([1, 1, 1]);
    translate([6, 3, 10]) cube([1, 1, 1]);
    translate([7, 4, 9]) cube([1, 1, 1]);
}
